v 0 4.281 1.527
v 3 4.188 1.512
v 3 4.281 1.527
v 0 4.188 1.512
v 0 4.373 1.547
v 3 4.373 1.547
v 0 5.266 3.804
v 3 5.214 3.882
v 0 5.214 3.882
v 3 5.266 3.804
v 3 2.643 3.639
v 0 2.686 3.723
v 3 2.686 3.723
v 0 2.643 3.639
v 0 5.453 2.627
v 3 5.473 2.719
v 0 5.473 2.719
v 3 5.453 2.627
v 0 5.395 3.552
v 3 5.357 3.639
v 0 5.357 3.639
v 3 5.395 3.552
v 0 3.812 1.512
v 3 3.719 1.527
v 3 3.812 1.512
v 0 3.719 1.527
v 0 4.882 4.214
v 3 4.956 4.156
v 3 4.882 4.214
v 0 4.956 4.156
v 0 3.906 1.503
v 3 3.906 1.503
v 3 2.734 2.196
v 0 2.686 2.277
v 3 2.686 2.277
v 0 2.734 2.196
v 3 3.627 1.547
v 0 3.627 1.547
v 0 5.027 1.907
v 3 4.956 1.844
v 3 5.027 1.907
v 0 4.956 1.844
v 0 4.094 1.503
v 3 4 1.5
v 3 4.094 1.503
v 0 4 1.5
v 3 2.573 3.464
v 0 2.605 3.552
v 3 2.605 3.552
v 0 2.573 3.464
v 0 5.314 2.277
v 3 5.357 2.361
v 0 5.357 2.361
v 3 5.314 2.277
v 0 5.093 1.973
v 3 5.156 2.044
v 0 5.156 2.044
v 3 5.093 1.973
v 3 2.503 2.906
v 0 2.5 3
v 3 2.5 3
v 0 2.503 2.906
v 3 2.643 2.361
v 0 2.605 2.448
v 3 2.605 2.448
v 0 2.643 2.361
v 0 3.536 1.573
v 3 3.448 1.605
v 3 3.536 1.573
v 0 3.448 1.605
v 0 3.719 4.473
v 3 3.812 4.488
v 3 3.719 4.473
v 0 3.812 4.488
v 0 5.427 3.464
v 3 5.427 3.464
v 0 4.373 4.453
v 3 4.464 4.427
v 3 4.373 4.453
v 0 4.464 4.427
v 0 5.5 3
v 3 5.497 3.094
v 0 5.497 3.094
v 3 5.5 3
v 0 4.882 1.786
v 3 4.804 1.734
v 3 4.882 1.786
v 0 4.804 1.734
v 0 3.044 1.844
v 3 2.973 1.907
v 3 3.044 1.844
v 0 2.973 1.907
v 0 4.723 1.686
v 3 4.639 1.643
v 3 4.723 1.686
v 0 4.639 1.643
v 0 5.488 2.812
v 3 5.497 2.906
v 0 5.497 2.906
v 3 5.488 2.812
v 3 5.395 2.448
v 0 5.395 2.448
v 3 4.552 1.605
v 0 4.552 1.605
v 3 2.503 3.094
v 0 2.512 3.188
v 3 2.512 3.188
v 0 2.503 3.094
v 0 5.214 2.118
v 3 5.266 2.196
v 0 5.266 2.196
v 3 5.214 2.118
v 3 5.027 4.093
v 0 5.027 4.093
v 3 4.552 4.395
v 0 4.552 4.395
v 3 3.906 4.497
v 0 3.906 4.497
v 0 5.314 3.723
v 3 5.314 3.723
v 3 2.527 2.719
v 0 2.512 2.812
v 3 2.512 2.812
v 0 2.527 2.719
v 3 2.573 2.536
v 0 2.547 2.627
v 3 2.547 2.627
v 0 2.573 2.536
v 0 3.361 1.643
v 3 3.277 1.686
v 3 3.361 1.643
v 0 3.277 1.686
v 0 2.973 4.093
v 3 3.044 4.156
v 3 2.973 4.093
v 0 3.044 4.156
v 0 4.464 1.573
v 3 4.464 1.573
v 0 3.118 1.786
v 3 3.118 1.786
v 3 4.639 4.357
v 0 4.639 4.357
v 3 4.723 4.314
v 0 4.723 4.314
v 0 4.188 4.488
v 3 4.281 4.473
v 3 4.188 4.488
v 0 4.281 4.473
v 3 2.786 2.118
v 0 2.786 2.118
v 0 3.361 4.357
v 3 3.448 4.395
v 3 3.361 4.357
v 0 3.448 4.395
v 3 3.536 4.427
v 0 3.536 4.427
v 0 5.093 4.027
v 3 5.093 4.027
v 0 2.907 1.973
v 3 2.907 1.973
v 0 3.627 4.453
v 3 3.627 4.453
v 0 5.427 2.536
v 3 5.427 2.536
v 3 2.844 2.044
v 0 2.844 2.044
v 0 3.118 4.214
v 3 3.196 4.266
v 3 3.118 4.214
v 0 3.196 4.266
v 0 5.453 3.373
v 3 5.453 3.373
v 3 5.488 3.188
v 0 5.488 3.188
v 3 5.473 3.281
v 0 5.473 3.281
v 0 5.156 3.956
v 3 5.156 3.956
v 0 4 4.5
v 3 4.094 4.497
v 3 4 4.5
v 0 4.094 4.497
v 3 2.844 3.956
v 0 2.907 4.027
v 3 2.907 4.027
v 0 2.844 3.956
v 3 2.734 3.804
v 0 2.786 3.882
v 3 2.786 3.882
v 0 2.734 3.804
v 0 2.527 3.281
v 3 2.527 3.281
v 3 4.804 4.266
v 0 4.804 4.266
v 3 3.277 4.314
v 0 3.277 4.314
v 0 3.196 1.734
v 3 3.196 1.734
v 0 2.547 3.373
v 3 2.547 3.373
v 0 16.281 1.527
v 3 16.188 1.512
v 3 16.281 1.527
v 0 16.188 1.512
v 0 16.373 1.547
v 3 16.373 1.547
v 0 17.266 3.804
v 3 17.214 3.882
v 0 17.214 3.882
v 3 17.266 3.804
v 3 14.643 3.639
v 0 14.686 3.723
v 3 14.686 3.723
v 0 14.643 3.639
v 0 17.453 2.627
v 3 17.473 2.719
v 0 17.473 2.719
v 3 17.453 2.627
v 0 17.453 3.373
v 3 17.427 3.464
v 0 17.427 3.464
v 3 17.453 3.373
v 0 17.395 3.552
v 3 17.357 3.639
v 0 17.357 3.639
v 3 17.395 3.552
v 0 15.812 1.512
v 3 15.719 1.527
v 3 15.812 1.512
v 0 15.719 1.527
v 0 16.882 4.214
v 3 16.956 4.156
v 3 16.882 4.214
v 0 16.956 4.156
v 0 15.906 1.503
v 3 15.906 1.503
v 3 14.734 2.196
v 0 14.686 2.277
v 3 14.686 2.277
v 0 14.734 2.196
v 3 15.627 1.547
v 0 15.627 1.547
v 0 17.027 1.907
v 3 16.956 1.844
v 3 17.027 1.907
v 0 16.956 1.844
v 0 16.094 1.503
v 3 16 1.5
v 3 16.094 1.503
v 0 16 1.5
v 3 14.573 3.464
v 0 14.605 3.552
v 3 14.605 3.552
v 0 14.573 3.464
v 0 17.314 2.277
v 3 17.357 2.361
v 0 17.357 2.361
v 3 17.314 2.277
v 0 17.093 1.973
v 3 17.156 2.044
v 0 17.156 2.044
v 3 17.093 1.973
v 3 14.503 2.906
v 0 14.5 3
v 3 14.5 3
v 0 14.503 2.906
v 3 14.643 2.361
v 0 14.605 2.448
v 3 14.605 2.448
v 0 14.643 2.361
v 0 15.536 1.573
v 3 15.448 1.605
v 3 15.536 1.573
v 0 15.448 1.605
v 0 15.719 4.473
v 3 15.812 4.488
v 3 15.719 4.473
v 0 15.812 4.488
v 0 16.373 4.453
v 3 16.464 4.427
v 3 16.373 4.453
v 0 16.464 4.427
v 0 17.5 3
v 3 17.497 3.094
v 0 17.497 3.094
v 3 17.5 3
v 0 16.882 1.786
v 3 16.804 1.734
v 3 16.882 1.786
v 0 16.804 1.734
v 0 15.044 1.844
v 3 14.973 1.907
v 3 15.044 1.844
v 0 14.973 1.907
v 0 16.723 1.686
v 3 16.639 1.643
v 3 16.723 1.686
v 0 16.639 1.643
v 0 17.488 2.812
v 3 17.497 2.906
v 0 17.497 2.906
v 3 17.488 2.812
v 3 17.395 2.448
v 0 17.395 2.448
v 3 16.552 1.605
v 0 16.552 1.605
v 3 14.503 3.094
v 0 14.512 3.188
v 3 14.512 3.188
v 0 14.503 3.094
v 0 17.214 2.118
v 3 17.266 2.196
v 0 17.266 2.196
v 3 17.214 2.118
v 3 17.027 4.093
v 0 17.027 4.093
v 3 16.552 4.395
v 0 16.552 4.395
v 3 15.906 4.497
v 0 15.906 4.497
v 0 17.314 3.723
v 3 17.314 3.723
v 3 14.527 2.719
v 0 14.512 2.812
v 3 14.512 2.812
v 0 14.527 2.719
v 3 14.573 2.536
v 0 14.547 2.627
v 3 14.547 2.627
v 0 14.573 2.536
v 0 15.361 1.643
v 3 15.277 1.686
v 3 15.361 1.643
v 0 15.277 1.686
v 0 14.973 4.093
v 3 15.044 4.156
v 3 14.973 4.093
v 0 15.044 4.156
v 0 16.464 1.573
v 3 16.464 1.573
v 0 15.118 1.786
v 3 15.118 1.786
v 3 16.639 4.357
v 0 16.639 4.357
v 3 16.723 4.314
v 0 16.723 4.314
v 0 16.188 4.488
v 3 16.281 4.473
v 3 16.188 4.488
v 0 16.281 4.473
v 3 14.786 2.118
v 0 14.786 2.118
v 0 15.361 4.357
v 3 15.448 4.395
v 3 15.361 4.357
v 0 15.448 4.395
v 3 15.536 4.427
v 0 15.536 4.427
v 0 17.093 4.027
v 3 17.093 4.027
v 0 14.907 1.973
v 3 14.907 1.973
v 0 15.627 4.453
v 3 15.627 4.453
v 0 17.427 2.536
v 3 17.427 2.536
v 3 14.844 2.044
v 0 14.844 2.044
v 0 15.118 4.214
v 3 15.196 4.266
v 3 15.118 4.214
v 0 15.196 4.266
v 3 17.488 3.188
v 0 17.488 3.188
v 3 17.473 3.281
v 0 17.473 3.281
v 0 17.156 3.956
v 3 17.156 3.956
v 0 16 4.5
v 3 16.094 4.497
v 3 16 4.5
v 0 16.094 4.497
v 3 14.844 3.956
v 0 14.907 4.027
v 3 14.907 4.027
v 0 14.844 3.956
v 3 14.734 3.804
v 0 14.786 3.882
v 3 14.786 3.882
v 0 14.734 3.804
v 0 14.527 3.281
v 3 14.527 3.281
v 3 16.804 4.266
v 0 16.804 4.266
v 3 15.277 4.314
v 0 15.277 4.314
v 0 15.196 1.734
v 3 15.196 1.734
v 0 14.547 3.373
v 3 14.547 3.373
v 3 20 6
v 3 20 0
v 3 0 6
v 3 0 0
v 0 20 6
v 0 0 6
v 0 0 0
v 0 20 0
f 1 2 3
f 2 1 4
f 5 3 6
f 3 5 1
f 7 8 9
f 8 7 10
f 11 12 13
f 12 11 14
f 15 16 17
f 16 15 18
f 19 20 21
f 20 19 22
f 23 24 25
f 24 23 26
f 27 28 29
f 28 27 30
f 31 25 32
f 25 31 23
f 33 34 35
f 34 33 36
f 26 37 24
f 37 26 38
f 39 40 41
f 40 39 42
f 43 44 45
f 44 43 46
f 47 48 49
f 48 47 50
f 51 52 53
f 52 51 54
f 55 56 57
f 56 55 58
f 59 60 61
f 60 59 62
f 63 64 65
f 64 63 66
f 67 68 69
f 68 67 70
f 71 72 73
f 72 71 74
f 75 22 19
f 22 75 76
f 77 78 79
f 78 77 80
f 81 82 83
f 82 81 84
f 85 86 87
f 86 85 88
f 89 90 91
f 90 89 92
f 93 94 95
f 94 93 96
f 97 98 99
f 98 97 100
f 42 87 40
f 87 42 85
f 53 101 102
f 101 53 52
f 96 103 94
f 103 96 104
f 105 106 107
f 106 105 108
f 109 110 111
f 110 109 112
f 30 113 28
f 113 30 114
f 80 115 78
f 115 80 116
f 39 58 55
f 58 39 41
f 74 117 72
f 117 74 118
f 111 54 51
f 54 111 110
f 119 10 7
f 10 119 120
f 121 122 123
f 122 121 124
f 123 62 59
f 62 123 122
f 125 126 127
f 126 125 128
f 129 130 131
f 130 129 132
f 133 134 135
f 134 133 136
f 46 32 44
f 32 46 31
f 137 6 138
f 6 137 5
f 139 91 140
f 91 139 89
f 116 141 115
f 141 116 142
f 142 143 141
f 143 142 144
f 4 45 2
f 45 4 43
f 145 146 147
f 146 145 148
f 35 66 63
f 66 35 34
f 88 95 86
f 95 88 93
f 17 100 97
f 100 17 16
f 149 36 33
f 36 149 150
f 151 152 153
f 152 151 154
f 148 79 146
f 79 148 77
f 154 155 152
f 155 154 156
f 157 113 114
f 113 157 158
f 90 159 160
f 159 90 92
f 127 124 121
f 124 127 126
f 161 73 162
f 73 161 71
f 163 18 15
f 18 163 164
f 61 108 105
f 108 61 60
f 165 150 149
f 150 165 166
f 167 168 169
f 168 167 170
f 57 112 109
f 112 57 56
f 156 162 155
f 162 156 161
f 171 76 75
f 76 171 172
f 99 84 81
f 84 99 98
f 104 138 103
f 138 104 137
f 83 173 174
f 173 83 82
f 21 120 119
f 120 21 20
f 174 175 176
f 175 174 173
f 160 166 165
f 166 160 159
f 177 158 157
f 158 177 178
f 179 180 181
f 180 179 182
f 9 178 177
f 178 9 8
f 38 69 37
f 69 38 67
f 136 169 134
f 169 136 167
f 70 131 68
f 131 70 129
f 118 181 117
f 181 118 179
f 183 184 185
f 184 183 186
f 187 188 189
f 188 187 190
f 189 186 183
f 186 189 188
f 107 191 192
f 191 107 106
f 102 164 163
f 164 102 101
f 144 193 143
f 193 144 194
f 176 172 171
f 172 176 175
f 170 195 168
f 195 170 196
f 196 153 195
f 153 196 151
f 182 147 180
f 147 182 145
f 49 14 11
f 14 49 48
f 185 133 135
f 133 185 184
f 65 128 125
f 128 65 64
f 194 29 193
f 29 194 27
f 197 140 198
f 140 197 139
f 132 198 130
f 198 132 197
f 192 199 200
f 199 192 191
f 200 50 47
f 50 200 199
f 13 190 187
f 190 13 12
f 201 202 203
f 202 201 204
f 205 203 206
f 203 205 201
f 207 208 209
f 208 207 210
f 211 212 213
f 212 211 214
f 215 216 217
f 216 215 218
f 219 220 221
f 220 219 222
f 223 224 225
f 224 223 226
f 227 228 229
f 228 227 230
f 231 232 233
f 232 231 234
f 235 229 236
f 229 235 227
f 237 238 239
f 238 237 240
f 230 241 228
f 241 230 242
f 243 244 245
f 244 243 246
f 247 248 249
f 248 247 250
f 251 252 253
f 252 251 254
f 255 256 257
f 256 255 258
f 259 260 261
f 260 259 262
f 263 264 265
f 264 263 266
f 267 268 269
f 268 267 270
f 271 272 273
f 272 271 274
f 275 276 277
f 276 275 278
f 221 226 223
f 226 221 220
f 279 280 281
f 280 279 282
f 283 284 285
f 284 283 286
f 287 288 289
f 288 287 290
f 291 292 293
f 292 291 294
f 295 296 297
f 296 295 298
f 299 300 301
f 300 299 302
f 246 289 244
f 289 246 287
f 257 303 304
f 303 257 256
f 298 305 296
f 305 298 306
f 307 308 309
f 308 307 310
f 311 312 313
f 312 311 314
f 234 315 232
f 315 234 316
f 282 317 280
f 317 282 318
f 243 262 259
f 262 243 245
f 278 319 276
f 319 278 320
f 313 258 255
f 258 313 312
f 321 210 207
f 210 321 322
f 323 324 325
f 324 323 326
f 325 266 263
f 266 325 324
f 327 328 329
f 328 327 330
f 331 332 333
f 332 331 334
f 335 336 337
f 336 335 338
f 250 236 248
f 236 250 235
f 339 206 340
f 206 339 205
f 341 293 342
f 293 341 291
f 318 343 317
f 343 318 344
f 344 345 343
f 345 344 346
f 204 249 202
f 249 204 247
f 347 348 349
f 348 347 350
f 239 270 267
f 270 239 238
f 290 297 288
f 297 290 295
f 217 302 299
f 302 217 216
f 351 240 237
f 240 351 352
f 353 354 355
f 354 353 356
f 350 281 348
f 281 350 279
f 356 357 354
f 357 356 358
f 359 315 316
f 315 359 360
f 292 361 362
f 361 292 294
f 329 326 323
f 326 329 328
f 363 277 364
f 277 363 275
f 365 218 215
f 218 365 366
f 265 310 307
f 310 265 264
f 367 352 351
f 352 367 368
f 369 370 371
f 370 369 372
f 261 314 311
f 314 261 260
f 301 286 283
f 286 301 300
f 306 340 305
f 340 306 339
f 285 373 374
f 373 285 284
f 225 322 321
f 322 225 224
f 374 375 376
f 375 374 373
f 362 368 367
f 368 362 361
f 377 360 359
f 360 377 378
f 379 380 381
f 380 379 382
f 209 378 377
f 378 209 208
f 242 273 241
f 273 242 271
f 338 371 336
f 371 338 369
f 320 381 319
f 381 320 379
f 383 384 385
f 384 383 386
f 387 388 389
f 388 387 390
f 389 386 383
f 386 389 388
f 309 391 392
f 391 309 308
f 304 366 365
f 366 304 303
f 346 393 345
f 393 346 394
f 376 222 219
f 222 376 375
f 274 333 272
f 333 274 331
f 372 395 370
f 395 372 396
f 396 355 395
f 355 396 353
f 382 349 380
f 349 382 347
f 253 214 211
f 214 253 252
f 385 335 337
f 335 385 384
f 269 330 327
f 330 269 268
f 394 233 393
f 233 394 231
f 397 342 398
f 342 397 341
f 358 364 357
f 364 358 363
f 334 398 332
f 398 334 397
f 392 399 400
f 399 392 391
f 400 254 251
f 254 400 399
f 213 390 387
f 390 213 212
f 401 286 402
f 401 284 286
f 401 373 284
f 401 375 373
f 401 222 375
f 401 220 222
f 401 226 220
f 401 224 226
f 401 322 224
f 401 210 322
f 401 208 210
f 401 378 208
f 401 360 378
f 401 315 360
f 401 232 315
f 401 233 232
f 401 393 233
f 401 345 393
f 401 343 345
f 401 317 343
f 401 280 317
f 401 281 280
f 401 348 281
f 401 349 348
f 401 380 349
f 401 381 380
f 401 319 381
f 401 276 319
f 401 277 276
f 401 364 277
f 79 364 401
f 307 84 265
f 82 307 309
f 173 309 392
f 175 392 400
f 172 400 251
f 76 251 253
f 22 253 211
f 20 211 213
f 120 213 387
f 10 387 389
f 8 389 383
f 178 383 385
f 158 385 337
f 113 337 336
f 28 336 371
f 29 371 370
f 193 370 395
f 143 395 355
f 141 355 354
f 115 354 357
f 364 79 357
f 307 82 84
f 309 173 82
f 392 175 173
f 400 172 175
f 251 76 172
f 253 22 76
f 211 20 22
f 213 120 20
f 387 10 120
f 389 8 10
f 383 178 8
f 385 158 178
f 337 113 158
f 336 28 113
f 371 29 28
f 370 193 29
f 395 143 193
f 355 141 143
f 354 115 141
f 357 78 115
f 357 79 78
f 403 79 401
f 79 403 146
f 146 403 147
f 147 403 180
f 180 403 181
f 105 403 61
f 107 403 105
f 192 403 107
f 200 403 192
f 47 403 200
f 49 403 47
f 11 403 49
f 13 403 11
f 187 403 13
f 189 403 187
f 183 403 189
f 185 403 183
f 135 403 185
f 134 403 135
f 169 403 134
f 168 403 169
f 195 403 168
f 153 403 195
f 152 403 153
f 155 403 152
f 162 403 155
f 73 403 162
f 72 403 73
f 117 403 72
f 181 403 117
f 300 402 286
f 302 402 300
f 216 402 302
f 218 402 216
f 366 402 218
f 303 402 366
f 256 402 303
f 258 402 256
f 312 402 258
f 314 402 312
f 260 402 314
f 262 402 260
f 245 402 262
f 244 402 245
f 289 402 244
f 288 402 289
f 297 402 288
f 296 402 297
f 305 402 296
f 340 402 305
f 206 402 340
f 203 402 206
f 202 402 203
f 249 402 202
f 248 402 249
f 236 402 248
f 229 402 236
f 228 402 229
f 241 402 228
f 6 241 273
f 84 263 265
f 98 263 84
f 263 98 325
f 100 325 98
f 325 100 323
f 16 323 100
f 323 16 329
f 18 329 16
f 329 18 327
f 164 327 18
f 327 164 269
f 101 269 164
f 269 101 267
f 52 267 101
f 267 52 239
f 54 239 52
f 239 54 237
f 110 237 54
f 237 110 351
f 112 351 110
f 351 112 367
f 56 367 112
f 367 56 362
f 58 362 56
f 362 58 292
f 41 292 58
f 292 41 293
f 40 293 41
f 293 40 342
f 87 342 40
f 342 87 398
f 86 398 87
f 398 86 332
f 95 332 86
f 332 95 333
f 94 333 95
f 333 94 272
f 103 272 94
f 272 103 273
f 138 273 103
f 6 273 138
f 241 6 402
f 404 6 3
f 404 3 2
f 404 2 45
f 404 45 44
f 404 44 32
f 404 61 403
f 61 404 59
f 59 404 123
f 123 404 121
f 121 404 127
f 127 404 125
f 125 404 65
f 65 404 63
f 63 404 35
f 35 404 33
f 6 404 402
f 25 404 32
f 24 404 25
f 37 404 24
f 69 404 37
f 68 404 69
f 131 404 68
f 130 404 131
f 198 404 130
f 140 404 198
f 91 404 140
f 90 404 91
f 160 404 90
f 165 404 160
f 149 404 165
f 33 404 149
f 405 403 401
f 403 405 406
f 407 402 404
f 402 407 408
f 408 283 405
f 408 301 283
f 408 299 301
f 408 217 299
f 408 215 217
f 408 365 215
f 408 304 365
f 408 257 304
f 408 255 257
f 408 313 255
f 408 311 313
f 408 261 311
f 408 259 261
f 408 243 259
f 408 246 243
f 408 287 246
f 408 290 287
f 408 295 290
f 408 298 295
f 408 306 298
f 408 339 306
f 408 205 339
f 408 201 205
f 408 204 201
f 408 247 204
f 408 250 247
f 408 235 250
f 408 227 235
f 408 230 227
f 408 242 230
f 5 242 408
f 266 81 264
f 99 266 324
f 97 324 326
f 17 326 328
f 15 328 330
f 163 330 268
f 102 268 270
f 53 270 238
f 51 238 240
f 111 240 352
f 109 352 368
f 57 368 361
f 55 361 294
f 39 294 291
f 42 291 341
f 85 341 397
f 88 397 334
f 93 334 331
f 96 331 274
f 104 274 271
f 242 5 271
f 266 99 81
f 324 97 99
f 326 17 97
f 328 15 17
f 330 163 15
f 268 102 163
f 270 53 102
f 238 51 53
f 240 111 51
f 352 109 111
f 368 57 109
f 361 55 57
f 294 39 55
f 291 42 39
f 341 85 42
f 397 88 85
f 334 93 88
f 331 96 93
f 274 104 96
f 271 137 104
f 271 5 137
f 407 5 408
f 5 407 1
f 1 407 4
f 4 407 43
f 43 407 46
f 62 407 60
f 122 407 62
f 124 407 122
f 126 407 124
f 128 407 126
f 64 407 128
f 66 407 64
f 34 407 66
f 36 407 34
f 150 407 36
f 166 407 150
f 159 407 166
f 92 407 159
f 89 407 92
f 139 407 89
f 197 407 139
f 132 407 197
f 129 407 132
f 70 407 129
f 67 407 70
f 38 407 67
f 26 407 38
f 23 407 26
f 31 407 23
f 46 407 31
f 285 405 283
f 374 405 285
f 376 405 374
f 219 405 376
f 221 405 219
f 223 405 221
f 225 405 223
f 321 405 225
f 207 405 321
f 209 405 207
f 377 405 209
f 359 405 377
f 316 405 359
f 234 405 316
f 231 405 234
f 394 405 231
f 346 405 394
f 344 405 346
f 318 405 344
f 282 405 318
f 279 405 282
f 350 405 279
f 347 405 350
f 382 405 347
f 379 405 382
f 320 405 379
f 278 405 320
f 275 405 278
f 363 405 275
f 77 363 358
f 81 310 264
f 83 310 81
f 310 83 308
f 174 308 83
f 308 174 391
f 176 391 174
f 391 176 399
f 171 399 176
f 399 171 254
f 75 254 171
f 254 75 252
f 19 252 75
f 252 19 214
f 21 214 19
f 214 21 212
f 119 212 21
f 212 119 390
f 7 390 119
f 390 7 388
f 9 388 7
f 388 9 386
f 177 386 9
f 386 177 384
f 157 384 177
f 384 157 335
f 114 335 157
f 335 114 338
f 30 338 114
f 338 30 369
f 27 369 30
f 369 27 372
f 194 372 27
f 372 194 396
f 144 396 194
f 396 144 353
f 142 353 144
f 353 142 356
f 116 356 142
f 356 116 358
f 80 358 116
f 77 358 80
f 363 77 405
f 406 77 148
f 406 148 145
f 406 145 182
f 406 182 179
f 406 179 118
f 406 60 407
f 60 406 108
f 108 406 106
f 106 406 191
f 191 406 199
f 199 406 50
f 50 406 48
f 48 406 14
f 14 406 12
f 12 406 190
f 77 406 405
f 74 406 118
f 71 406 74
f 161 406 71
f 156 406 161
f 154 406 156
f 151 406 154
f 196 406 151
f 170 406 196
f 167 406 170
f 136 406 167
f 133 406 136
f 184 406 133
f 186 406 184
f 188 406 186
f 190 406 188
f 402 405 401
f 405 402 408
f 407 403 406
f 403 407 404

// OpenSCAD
difference(){
	union(){
        translate([0,0,0]){
            rotate([0,0,0]){
                cube([3,20,6], center=false);
            }
        }        
      


        
	}
	union() {
      translate([-1,4,3]){
            rotate([0,90,0]){
                cylinder(h=5, r=1.5, $fn=100, center=false);
            }
        }   
      translate([-1,16,3]){
            rotate([0,90,0]){
                cylinder(h=5, r=1.5, $fn=100, center=false);
            }
        }   


   
	}
}
